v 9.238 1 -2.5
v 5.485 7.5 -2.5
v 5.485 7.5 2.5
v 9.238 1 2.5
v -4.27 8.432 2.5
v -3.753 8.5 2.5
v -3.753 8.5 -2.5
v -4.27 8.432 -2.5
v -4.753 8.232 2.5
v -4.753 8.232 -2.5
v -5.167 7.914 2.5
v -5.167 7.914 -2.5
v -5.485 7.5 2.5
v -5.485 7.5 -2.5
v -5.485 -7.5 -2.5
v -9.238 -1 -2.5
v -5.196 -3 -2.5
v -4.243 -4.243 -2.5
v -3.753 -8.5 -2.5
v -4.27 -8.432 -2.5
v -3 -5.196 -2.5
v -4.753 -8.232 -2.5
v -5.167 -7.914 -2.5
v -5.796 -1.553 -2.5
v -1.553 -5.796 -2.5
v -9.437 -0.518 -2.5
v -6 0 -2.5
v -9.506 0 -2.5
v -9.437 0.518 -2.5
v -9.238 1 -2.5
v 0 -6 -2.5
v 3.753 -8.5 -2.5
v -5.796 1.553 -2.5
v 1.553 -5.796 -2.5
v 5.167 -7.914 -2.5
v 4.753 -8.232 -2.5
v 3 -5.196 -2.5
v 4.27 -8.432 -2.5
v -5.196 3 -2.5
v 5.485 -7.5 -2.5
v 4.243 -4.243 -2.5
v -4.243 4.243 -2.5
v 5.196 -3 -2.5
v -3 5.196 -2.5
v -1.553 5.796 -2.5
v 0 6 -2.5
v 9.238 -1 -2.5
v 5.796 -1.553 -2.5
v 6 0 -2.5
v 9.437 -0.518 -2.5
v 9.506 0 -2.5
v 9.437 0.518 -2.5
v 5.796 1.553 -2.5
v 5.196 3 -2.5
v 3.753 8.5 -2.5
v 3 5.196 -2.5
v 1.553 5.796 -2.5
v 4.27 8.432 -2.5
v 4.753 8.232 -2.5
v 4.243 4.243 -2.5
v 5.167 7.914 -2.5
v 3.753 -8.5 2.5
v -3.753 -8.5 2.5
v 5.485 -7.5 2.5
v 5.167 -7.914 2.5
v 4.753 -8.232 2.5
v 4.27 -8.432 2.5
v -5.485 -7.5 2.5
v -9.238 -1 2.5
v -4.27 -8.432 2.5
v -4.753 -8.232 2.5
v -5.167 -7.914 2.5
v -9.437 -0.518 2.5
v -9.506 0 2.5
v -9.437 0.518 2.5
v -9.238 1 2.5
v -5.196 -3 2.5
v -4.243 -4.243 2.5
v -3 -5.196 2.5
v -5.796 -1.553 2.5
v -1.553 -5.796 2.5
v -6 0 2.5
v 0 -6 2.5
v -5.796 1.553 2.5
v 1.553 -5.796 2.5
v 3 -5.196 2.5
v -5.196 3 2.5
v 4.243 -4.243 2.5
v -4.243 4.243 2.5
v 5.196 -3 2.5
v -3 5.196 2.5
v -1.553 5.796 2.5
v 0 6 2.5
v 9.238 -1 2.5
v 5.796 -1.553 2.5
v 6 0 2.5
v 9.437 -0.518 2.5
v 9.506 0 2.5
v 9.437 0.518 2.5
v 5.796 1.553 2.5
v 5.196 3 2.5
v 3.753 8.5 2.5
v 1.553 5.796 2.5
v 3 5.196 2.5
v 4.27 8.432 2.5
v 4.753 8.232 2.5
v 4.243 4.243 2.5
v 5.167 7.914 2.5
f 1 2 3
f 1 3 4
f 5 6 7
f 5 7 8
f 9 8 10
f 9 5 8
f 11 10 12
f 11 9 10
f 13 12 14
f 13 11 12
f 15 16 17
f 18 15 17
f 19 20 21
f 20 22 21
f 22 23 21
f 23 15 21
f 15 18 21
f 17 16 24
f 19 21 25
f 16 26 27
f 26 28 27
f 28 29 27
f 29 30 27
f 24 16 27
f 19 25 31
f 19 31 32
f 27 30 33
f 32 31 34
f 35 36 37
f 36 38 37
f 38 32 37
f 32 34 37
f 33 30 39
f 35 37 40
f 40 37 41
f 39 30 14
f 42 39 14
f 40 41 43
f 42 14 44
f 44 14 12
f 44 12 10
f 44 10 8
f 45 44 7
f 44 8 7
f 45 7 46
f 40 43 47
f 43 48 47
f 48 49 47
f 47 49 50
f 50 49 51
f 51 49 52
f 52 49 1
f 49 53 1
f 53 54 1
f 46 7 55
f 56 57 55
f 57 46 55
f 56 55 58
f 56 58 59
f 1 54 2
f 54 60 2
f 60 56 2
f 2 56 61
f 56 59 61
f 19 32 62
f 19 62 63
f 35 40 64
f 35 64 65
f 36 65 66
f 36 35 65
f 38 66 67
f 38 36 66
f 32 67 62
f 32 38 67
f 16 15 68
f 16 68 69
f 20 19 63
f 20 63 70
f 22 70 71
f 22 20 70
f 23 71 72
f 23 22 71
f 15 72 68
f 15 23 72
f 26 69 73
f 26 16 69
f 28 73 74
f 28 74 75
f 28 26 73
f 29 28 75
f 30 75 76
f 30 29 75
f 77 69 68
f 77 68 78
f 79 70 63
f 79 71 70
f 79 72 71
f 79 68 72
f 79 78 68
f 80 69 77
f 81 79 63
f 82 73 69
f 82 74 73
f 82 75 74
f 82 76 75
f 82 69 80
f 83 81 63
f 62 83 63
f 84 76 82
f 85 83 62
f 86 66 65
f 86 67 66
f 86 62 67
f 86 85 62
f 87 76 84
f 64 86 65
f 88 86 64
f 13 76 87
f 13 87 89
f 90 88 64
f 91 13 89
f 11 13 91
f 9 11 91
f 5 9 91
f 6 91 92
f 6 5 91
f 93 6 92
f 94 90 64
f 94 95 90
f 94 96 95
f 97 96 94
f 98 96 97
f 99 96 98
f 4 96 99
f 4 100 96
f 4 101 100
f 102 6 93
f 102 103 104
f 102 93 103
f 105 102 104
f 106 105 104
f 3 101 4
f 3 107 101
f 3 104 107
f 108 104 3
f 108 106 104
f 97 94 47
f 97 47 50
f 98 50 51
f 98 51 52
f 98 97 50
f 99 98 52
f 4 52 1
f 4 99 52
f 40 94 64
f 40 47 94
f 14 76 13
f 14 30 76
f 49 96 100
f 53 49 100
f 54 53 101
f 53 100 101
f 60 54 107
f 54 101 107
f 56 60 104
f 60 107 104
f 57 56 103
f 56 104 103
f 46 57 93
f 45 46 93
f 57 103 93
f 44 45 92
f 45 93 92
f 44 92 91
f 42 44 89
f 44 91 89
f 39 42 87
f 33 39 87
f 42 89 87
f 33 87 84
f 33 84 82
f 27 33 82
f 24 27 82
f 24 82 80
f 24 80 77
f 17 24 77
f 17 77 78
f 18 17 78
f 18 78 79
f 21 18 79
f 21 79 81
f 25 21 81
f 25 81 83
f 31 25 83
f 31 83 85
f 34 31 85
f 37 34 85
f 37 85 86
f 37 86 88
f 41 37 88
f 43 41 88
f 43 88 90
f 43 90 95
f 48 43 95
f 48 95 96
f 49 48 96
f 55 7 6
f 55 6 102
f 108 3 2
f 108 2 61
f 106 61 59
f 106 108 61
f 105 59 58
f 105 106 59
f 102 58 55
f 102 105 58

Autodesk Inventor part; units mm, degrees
ref_plane "YZ Plane" through (0, 0, 0) normal (1, 0, 0) x (0, 1, 0)
ref_plane "XZ Plane" through (0, 0, 0) normal (0, 1, 0) x (-1, 0, 0)
ref_plane "XY Plane" through (0, 0, 0) normal (0, 0, 1) x (1, 0, 0)
sketch "Sketch1" plane through (0, 0, 0) normal (0, 0, 1) x (1, 0, 0)
  line L0 (9.815, 0) -> (4.9075, -8.5)
  line L1 (4.9075, -8.5) -> (-4.9075, -8.5)
  line L2 (-4.9075, -8.5) -> (-9.815, 0)
  line L3 (-9.815, 0) -> (-4.9075, 8.5)
  line L4 (-4.9075, 8.5) -> (4.9075, 8.5)
  line L5 (4.9075, 8.5) -> (9.815, 0)
  point P0 (0, 0)
  point P1 (0, 0)
  dimension "d0" = 17
extrude "Extrusion1" add sketch "Sketch1" along normal mid plane 5
sketch "Sketch2" plane through (0, 0, 2.5) normal (0, 0, 1) x (1, 0, 0)
  circle A0 centre (0, 0) radius 6
  dimension "d3" = 12
extrude "Extrusion2" cut sketch "Sketch2" against normal through all
fillet "Fillet1" radius 2 6 edges at (4.9075, -8.5, 0) (-4.9075, -8.5, 0) (-9.815, 0, 0) (-4.9075, 8.5, 0) (4.9075, 8.5, 0) (9.815, 0, 0)
properties part number "M12_NUT_1.262.1200.50"
